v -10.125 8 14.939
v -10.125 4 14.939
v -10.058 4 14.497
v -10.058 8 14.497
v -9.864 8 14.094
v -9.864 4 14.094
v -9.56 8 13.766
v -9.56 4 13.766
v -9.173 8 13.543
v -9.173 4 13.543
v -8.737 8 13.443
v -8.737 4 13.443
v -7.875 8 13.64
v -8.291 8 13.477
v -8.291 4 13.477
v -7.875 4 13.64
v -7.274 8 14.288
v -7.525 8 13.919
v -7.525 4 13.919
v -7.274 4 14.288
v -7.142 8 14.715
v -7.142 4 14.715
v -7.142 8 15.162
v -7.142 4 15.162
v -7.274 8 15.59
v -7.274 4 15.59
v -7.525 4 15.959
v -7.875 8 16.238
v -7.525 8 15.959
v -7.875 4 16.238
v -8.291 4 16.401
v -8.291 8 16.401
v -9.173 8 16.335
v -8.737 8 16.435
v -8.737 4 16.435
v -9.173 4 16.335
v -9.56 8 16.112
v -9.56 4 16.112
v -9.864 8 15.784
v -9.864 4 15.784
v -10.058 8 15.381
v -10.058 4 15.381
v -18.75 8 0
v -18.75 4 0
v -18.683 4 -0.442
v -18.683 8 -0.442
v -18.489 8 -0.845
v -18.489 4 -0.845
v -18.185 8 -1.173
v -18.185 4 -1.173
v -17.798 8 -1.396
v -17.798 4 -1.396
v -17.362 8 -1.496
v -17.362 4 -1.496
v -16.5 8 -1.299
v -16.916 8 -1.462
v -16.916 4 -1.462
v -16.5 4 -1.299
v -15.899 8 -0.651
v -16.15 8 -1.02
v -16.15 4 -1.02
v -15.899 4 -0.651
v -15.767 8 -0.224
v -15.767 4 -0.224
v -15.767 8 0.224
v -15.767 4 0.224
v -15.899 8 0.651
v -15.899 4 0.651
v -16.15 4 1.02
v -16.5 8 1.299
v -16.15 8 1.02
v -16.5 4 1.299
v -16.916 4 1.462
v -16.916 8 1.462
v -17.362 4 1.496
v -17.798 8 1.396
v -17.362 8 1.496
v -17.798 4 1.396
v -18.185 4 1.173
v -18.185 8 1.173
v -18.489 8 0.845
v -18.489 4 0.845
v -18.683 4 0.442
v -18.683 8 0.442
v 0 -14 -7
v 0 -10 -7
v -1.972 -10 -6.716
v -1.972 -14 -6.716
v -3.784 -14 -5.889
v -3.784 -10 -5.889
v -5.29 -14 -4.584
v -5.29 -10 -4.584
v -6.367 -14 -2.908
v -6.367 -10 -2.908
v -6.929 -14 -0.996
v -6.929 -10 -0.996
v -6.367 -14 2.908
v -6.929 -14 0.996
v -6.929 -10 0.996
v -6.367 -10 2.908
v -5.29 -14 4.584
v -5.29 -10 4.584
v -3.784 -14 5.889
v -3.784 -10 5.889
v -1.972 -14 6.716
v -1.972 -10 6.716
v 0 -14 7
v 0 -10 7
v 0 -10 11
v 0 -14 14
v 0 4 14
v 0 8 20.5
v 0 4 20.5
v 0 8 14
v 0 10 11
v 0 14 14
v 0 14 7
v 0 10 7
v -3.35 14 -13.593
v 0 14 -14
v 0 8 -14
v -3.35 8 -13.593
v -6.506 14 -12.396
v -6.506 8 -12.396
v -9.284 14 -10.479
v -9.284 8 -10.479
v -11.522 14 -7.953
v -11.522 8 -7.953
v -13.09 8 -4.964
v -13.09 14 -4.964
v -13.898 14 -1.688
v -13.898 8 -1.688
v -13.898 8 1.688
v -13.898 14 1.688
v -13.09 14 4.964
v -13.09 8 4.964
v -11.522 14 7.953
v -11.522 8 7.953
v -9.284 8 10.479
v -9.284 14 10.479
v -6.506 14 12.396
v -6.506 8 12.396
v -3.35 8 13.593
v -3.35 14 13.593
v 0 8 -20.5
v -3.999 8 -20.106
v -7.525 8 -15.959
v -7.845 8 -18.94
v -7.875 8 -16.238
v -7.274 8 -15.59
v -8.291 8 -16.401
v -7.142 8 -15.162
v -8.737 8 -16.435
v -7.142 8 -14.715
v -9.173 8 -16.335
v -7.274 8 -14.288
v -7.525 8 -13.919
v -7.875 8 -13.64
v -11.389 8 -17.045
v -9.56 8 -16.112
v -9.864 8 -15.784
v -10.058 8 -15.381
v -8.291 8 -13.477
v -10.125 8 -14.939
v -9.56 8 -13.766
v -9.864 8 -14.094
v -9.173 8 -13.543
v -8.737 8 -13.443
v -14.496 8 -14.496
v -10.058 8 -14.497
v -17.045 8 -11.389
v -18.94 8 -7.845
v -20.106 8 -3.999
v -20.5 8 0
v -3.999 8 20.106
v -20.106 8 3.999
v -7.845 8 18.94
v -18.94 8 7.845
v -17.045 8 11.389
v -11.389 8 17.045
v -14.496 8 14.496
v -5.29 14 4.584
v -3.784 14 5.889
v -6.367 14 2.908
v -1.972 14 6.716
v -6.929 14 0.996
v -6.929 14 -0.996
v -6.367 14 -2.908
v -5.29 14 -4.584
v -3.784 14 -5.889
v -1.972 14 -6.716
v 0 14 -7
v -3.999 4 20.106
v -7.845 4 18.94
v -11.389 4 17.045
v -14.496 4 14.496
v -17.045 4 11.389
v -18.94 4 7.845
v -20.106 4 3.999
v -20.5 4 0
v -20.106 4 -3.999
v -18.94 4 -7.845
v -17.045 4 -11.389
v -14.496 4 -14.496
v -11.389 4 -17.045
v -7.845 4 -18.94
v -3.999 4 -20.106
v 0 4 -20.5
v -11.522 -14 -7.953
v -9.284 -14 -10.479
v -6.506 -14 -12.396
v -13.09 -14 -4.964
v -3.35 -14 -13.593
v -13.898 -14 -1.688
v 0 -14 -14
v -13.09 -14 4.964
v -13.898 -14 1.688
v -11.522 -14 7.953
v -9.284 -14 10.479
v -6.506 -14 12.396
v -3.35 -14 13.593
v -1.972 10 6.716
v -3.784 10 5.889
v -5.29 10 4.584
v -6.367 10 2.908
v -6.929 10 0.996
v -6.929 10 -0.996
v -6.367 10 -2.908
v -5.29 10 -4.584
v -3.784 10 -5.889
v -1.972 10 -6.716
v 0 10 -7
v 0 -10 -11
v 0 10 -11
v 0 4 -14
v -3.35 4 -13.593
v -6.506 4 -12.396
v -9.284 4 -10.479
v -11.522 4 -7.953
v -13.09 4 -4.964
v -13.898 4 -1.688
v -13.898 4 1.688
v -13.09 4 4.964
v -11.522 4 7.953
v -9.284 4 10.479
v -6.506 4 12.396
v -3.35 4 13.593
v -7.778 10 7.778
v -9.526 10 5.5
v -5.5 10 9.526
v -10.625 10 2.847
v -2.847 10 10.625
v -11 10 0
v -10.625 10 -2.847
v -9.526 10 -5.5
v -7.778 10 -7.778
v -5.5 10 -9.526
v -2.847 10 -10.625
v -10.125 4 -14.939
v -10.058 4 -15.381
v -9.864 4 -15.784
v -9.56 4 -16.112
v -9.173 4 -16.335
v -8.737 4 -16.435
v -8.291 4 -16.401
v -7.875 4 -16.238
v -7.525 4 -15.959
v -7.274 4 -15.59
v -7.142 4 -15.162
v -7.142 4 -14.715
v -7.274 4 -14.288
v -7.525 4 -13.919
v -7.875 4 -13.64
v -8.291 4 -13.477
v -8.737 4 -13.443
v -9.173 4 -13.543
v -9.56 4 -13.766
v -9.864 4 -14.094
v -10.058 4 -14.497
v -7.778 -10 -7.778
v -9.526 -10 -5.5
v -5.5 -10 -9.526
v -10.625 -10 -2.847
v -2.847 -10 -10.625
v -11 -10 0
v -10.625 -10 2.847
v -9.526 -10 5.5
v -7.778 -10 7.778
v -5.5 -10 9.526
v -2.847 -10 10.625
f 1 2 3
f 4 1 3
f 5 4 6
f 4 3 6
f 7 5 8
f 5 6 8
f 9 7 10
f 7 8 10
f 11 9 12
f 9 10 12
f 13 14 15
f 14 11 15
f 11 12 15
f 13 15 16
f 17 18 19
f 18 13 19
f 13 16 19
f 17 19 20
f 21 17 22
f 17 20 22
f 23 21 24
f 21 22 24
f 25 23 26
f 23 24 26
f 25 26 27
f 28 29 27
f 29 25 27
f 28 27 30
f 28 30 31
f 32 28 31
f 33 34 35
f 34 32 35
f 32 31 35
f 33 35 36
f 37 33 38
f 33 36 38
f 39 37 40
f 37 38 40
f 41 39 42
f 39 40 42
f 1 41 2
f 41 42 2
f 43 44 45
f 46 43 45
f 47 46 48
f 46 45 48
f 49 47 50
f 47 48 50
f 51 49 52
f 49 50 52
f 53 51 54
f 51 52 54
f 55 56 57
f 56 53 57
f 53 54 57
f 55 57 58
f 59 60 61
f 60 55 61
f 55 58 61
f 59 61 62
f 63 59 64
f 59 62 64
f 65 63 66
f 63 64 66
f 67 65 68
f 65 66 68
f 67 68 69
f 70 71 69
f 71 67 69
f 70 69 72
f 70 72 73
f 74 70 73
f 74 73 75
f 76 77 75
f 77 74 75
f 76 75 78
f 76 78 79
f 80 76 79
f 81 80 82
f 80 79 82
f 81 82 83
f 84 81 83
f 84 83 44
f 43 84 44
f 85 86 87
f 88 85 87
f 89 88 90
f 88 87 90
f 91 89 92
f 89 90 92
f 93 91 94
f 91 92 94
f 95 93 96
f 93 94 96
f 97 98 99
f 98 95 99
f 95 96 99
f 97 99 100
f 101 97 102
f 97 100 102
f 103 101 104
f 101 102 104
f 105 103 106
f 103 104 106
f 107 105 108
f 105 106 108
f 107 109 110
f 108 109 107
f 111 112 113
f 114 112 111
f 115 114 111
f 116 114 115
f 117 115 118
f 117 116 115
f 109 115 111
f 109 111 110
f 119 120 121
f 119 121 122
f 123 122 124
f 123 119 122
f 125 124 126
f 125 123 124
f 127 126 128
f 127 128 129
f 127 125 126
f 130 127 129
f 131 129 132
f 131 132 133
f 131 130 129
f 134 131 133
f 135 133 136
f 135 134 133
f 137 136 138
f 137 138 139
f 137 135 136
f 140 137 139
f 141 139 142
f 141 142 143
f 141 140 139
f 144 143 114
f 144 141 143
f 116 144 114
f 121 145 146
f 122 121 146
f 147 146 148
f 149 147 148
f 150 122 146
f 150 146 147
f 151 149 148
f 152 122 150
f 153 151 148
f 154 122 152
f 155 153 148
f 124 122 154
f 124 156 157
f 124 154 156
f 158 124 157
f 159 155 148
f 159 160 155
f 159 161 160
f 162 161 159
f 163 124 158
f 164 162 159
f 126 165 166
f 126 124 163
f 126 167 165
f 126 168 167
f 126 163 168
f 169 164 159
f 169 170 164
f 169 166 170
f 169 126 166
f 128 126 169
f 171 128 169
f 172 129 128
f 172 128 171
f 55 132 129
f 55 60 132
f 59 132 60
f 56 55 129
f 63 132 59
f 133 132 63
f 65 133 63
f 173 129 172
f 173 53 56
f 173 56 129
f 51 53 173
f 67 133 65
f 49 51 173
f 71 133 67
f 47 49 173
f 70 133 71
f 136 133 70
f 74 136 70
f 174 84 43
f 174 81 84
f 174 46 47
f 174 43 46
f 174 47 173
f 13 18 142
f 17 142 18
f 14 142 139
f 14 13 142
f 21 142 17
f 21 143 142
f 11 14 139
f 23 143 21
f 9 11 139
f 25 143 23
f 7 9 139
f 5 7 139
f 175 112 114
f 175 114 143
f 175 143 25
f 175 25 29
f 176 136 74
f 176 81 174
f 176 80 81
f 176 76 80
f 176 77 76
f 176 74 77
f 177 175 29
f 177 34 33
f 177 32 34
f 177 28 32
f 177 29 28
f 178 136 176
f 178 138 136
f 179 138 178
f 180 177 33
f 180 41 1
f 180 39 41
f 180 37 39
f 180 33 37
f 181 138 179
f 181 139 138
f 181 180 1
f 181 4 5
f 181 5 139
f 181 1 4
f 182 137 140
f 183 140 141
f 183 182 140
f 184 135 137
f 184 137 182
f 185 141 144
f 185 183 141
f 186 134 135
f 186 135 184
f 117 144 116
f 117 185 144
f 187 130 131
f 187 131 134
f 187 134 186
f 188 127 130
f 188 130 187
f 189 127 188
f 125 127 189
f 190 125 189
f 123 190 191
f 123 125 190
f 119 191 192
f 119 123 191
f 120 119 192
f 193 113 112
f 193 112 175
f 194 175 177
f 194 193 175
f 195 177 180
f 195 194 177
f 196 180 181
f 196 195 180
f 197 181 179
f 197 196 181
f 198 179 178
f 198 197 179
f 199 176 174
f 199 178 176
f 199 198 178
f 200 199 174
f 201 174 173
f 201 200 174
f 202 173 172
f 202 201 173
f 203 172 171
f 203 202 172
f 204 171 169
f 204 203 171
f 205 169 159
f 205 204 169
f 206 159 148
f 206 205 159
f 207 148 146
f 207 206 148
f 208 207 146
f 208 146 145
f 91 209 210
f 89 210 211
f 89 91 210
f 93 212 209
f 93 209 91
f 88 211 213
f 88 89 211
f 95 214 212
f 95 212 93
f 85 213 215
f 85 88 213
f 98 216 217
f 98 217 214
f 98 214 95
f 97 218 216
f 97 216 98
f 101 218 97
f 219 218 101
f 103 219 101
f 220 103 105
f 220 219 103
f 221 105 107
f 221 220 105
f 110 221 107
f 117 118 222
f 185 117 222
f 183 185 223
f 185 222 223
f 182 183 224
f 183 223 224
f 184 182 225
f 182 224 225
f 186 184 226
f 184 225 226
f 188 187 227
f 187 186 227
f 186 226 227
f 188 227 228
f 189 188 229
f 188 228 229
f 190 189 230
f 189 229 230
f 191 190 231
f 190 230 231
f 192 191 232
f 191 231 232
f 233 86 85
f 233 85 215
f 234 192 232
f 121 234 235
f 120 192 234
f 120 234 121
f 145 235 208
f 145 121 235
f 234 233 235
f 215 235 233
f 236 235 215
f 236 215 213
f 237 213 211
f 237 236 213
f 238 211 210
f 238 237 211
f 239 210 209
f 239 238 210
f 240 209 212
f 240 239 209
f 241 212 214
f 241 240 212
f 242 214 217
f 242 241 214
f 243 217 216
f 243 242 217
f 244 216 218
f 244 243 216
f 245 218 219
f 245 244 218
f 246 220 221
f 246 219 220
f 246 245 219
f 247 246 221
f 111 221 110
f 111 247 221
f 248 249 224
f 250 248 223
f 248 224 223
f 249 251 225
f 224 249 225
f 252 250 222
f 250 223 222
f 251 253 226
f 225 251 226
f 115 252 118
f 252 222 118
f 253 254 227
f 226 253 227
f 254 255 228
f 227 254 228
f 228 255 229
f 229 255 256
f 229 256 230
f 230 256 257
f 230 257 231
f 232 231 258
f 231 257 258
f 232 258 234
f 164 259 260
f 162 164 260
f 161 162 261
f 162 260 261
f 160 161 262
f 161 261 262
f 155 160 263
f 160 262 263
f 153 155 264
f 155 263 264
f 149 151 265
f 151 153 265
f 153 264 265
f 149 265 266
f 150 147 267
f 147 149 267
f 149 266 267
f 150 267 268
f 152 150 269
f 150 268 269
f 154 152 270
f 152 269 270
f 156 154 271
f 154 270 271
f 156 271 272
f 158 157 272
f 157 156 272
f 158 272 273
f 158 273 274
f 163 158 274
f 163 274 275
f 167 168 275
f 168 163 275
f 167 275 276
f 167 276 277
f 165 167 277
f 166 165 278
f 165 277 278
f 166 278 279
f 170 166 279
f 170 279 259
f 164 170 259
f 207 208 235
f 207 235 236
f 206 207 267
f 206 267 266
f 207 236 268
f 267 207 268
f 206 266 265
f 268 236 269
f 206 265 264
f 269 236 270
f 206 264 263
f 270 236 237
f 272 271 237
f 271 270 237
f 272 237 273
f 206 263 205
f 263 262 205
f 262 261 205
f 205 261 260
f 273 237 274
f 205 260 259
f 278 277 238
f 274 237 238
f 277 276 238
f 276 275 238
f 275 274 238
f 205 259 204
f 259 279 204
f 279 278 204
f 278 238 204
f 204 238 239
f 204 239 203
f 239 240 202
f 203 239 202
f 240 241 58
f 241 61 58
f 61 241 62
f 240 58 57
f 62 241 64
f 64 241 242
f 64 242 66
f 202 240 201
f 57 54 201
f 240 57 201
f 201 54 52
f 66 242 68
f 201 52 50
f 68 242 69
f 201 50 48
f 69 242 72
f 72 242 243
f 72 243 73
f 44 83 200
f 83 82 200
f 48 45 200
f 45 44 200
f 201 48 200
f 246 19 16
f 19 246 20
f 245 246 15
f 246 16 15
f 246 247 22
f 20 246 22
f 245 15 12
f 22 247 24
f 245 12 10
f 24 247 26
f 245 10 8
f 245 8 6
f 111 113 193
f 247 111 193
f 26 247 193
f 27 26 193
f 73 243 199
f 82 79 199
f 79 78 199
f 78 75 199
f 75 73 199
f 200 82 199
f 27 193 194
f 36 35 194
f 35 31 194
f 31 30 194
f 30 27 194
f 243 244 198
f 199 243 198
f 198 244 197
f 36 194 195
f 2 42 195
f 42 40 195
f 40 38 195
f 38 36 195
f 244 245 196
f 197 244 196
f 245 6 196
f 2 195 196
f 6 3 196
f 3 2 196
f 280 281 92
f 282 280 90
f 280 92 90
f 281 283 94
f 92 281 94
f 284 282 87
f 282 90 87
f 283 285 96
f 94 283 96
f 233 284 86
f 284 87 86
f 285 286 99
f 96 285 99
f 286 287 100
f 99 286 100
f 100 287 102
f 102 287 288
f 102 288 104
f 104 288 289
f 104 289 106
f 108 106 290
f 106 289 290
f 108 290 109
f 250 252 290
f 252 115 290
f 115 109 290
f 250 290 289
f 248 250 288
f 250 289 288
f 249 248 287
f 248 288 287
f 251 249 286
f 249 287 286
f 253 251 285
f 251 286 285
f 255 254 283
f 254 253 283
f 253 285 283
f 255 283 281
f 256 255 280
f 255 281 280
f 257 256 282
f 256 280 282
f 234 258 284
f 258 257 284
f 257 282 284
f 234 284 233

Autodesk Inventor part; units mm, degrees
ref_plane "YZ Plane" through (0, 0, 0) normal (1, 0, 0) x (0, 1, 0)
ref_plane "XY Plane" through (0, 0, 0) normal (0, 0, 1) x (1, 0, 0)
sketch "Sketch1" plane through (0, 0, 0) normal (0, 1, 0) x (-1, 0, 0)
  arc A0 (0, -11) -> (0, 11) centre (0, 0) ccw
  line L0 (0, 0) -> (0, -11) construction
  line L1 (0, 0) -> (0, 11) construction
  arc A1 (0, -14) -> (0, 14) centre (0, 0) ccw
  line L2 (0, 11) -> (0, 14)
  line L3 (0, -11) -> (0, -14)
  dimension "d0" = 180
  dimension "d1" = 11
  dimension "d3" = 3
extrude "Extrusion1" add sketch "Sketch1" along normal mid plane 20
sketch "Sketch2" plane through (0, 10, 0) normal (0, 1, 0) x (1, 0, 0)
  arc A0 (0, 14) -> (0, -14) centre (0, 0) ccw projected
  arc A1 (0, 11) -> (0, -11) centre (0, 0) ccw construction
  arc A2 (0, 7) -> (0, -7) centre (0, 0) ccw
  line L0 (0, 11) -> (0, 14) projected
  line L1 (0, 14) -> (0, 7)
  line L2 (0, -7) -> (0, -14)
  dimension "d6" = 4
extrude "Extrusion2" add sketch "Sketch2" along normal blind 4
sketch "Sketch3" plane through (0, -10, 0) normal (0, -1, 0) x (1, 0, 0)
  arc A0 (0, 14) -> (0, -14) centre (0, 0) ccw projected
  line L0 (0, 14) -> (0, 7) projected
  arc A1 (0, 7) -> (0, -7) centre (0, 0) ccw projected
  line L1 (0, -7) -> (0, -14) projected
  arc A2 (0, 14) -> (0, -14) centre (0, 0) ccw projected
  point P0 (0, -14)
extrude "Extrusion3" add sketch "Sketch3" along normal blind 4
ref_plane "Work Plane1" through (0, 4, 0) normal (0, 1, 0) x (-1, 0, 0)
sketch "Sketch4" plane through (0, 4, 0) normal (0, 1, 0) x (-1, 0, 0)
  arc A0 (0, -14) -> (0, 14) centre (0, 0) ccw projected
  arc A1 (0, -20.5) -> (0, 20.5) centre (0, 0) ccw
  line L0 (0, 20.5) -> (0, 14)
  line L1 (0, -14) -> (0, -20.5)
  circle A2 centre (17.25, 0) radius 1.5
  line L2 (14, 0) -> (20.5, 0) construction
  circle A3 centre (8.625, 14.9389) radius 1.5
  circle A4 centre (8.625, -14.9389) radius 1.5
  dimension "d12" = 6.5
  dimension "d13" = 3
  dimension "d16" = 60
  dimension "d20" = 60
extrude "Extrusion4" add sketch "Sketch4" along normal blind 4
properties part number "Spindle_Block_Holder" material "PC/ABS Plastic"
